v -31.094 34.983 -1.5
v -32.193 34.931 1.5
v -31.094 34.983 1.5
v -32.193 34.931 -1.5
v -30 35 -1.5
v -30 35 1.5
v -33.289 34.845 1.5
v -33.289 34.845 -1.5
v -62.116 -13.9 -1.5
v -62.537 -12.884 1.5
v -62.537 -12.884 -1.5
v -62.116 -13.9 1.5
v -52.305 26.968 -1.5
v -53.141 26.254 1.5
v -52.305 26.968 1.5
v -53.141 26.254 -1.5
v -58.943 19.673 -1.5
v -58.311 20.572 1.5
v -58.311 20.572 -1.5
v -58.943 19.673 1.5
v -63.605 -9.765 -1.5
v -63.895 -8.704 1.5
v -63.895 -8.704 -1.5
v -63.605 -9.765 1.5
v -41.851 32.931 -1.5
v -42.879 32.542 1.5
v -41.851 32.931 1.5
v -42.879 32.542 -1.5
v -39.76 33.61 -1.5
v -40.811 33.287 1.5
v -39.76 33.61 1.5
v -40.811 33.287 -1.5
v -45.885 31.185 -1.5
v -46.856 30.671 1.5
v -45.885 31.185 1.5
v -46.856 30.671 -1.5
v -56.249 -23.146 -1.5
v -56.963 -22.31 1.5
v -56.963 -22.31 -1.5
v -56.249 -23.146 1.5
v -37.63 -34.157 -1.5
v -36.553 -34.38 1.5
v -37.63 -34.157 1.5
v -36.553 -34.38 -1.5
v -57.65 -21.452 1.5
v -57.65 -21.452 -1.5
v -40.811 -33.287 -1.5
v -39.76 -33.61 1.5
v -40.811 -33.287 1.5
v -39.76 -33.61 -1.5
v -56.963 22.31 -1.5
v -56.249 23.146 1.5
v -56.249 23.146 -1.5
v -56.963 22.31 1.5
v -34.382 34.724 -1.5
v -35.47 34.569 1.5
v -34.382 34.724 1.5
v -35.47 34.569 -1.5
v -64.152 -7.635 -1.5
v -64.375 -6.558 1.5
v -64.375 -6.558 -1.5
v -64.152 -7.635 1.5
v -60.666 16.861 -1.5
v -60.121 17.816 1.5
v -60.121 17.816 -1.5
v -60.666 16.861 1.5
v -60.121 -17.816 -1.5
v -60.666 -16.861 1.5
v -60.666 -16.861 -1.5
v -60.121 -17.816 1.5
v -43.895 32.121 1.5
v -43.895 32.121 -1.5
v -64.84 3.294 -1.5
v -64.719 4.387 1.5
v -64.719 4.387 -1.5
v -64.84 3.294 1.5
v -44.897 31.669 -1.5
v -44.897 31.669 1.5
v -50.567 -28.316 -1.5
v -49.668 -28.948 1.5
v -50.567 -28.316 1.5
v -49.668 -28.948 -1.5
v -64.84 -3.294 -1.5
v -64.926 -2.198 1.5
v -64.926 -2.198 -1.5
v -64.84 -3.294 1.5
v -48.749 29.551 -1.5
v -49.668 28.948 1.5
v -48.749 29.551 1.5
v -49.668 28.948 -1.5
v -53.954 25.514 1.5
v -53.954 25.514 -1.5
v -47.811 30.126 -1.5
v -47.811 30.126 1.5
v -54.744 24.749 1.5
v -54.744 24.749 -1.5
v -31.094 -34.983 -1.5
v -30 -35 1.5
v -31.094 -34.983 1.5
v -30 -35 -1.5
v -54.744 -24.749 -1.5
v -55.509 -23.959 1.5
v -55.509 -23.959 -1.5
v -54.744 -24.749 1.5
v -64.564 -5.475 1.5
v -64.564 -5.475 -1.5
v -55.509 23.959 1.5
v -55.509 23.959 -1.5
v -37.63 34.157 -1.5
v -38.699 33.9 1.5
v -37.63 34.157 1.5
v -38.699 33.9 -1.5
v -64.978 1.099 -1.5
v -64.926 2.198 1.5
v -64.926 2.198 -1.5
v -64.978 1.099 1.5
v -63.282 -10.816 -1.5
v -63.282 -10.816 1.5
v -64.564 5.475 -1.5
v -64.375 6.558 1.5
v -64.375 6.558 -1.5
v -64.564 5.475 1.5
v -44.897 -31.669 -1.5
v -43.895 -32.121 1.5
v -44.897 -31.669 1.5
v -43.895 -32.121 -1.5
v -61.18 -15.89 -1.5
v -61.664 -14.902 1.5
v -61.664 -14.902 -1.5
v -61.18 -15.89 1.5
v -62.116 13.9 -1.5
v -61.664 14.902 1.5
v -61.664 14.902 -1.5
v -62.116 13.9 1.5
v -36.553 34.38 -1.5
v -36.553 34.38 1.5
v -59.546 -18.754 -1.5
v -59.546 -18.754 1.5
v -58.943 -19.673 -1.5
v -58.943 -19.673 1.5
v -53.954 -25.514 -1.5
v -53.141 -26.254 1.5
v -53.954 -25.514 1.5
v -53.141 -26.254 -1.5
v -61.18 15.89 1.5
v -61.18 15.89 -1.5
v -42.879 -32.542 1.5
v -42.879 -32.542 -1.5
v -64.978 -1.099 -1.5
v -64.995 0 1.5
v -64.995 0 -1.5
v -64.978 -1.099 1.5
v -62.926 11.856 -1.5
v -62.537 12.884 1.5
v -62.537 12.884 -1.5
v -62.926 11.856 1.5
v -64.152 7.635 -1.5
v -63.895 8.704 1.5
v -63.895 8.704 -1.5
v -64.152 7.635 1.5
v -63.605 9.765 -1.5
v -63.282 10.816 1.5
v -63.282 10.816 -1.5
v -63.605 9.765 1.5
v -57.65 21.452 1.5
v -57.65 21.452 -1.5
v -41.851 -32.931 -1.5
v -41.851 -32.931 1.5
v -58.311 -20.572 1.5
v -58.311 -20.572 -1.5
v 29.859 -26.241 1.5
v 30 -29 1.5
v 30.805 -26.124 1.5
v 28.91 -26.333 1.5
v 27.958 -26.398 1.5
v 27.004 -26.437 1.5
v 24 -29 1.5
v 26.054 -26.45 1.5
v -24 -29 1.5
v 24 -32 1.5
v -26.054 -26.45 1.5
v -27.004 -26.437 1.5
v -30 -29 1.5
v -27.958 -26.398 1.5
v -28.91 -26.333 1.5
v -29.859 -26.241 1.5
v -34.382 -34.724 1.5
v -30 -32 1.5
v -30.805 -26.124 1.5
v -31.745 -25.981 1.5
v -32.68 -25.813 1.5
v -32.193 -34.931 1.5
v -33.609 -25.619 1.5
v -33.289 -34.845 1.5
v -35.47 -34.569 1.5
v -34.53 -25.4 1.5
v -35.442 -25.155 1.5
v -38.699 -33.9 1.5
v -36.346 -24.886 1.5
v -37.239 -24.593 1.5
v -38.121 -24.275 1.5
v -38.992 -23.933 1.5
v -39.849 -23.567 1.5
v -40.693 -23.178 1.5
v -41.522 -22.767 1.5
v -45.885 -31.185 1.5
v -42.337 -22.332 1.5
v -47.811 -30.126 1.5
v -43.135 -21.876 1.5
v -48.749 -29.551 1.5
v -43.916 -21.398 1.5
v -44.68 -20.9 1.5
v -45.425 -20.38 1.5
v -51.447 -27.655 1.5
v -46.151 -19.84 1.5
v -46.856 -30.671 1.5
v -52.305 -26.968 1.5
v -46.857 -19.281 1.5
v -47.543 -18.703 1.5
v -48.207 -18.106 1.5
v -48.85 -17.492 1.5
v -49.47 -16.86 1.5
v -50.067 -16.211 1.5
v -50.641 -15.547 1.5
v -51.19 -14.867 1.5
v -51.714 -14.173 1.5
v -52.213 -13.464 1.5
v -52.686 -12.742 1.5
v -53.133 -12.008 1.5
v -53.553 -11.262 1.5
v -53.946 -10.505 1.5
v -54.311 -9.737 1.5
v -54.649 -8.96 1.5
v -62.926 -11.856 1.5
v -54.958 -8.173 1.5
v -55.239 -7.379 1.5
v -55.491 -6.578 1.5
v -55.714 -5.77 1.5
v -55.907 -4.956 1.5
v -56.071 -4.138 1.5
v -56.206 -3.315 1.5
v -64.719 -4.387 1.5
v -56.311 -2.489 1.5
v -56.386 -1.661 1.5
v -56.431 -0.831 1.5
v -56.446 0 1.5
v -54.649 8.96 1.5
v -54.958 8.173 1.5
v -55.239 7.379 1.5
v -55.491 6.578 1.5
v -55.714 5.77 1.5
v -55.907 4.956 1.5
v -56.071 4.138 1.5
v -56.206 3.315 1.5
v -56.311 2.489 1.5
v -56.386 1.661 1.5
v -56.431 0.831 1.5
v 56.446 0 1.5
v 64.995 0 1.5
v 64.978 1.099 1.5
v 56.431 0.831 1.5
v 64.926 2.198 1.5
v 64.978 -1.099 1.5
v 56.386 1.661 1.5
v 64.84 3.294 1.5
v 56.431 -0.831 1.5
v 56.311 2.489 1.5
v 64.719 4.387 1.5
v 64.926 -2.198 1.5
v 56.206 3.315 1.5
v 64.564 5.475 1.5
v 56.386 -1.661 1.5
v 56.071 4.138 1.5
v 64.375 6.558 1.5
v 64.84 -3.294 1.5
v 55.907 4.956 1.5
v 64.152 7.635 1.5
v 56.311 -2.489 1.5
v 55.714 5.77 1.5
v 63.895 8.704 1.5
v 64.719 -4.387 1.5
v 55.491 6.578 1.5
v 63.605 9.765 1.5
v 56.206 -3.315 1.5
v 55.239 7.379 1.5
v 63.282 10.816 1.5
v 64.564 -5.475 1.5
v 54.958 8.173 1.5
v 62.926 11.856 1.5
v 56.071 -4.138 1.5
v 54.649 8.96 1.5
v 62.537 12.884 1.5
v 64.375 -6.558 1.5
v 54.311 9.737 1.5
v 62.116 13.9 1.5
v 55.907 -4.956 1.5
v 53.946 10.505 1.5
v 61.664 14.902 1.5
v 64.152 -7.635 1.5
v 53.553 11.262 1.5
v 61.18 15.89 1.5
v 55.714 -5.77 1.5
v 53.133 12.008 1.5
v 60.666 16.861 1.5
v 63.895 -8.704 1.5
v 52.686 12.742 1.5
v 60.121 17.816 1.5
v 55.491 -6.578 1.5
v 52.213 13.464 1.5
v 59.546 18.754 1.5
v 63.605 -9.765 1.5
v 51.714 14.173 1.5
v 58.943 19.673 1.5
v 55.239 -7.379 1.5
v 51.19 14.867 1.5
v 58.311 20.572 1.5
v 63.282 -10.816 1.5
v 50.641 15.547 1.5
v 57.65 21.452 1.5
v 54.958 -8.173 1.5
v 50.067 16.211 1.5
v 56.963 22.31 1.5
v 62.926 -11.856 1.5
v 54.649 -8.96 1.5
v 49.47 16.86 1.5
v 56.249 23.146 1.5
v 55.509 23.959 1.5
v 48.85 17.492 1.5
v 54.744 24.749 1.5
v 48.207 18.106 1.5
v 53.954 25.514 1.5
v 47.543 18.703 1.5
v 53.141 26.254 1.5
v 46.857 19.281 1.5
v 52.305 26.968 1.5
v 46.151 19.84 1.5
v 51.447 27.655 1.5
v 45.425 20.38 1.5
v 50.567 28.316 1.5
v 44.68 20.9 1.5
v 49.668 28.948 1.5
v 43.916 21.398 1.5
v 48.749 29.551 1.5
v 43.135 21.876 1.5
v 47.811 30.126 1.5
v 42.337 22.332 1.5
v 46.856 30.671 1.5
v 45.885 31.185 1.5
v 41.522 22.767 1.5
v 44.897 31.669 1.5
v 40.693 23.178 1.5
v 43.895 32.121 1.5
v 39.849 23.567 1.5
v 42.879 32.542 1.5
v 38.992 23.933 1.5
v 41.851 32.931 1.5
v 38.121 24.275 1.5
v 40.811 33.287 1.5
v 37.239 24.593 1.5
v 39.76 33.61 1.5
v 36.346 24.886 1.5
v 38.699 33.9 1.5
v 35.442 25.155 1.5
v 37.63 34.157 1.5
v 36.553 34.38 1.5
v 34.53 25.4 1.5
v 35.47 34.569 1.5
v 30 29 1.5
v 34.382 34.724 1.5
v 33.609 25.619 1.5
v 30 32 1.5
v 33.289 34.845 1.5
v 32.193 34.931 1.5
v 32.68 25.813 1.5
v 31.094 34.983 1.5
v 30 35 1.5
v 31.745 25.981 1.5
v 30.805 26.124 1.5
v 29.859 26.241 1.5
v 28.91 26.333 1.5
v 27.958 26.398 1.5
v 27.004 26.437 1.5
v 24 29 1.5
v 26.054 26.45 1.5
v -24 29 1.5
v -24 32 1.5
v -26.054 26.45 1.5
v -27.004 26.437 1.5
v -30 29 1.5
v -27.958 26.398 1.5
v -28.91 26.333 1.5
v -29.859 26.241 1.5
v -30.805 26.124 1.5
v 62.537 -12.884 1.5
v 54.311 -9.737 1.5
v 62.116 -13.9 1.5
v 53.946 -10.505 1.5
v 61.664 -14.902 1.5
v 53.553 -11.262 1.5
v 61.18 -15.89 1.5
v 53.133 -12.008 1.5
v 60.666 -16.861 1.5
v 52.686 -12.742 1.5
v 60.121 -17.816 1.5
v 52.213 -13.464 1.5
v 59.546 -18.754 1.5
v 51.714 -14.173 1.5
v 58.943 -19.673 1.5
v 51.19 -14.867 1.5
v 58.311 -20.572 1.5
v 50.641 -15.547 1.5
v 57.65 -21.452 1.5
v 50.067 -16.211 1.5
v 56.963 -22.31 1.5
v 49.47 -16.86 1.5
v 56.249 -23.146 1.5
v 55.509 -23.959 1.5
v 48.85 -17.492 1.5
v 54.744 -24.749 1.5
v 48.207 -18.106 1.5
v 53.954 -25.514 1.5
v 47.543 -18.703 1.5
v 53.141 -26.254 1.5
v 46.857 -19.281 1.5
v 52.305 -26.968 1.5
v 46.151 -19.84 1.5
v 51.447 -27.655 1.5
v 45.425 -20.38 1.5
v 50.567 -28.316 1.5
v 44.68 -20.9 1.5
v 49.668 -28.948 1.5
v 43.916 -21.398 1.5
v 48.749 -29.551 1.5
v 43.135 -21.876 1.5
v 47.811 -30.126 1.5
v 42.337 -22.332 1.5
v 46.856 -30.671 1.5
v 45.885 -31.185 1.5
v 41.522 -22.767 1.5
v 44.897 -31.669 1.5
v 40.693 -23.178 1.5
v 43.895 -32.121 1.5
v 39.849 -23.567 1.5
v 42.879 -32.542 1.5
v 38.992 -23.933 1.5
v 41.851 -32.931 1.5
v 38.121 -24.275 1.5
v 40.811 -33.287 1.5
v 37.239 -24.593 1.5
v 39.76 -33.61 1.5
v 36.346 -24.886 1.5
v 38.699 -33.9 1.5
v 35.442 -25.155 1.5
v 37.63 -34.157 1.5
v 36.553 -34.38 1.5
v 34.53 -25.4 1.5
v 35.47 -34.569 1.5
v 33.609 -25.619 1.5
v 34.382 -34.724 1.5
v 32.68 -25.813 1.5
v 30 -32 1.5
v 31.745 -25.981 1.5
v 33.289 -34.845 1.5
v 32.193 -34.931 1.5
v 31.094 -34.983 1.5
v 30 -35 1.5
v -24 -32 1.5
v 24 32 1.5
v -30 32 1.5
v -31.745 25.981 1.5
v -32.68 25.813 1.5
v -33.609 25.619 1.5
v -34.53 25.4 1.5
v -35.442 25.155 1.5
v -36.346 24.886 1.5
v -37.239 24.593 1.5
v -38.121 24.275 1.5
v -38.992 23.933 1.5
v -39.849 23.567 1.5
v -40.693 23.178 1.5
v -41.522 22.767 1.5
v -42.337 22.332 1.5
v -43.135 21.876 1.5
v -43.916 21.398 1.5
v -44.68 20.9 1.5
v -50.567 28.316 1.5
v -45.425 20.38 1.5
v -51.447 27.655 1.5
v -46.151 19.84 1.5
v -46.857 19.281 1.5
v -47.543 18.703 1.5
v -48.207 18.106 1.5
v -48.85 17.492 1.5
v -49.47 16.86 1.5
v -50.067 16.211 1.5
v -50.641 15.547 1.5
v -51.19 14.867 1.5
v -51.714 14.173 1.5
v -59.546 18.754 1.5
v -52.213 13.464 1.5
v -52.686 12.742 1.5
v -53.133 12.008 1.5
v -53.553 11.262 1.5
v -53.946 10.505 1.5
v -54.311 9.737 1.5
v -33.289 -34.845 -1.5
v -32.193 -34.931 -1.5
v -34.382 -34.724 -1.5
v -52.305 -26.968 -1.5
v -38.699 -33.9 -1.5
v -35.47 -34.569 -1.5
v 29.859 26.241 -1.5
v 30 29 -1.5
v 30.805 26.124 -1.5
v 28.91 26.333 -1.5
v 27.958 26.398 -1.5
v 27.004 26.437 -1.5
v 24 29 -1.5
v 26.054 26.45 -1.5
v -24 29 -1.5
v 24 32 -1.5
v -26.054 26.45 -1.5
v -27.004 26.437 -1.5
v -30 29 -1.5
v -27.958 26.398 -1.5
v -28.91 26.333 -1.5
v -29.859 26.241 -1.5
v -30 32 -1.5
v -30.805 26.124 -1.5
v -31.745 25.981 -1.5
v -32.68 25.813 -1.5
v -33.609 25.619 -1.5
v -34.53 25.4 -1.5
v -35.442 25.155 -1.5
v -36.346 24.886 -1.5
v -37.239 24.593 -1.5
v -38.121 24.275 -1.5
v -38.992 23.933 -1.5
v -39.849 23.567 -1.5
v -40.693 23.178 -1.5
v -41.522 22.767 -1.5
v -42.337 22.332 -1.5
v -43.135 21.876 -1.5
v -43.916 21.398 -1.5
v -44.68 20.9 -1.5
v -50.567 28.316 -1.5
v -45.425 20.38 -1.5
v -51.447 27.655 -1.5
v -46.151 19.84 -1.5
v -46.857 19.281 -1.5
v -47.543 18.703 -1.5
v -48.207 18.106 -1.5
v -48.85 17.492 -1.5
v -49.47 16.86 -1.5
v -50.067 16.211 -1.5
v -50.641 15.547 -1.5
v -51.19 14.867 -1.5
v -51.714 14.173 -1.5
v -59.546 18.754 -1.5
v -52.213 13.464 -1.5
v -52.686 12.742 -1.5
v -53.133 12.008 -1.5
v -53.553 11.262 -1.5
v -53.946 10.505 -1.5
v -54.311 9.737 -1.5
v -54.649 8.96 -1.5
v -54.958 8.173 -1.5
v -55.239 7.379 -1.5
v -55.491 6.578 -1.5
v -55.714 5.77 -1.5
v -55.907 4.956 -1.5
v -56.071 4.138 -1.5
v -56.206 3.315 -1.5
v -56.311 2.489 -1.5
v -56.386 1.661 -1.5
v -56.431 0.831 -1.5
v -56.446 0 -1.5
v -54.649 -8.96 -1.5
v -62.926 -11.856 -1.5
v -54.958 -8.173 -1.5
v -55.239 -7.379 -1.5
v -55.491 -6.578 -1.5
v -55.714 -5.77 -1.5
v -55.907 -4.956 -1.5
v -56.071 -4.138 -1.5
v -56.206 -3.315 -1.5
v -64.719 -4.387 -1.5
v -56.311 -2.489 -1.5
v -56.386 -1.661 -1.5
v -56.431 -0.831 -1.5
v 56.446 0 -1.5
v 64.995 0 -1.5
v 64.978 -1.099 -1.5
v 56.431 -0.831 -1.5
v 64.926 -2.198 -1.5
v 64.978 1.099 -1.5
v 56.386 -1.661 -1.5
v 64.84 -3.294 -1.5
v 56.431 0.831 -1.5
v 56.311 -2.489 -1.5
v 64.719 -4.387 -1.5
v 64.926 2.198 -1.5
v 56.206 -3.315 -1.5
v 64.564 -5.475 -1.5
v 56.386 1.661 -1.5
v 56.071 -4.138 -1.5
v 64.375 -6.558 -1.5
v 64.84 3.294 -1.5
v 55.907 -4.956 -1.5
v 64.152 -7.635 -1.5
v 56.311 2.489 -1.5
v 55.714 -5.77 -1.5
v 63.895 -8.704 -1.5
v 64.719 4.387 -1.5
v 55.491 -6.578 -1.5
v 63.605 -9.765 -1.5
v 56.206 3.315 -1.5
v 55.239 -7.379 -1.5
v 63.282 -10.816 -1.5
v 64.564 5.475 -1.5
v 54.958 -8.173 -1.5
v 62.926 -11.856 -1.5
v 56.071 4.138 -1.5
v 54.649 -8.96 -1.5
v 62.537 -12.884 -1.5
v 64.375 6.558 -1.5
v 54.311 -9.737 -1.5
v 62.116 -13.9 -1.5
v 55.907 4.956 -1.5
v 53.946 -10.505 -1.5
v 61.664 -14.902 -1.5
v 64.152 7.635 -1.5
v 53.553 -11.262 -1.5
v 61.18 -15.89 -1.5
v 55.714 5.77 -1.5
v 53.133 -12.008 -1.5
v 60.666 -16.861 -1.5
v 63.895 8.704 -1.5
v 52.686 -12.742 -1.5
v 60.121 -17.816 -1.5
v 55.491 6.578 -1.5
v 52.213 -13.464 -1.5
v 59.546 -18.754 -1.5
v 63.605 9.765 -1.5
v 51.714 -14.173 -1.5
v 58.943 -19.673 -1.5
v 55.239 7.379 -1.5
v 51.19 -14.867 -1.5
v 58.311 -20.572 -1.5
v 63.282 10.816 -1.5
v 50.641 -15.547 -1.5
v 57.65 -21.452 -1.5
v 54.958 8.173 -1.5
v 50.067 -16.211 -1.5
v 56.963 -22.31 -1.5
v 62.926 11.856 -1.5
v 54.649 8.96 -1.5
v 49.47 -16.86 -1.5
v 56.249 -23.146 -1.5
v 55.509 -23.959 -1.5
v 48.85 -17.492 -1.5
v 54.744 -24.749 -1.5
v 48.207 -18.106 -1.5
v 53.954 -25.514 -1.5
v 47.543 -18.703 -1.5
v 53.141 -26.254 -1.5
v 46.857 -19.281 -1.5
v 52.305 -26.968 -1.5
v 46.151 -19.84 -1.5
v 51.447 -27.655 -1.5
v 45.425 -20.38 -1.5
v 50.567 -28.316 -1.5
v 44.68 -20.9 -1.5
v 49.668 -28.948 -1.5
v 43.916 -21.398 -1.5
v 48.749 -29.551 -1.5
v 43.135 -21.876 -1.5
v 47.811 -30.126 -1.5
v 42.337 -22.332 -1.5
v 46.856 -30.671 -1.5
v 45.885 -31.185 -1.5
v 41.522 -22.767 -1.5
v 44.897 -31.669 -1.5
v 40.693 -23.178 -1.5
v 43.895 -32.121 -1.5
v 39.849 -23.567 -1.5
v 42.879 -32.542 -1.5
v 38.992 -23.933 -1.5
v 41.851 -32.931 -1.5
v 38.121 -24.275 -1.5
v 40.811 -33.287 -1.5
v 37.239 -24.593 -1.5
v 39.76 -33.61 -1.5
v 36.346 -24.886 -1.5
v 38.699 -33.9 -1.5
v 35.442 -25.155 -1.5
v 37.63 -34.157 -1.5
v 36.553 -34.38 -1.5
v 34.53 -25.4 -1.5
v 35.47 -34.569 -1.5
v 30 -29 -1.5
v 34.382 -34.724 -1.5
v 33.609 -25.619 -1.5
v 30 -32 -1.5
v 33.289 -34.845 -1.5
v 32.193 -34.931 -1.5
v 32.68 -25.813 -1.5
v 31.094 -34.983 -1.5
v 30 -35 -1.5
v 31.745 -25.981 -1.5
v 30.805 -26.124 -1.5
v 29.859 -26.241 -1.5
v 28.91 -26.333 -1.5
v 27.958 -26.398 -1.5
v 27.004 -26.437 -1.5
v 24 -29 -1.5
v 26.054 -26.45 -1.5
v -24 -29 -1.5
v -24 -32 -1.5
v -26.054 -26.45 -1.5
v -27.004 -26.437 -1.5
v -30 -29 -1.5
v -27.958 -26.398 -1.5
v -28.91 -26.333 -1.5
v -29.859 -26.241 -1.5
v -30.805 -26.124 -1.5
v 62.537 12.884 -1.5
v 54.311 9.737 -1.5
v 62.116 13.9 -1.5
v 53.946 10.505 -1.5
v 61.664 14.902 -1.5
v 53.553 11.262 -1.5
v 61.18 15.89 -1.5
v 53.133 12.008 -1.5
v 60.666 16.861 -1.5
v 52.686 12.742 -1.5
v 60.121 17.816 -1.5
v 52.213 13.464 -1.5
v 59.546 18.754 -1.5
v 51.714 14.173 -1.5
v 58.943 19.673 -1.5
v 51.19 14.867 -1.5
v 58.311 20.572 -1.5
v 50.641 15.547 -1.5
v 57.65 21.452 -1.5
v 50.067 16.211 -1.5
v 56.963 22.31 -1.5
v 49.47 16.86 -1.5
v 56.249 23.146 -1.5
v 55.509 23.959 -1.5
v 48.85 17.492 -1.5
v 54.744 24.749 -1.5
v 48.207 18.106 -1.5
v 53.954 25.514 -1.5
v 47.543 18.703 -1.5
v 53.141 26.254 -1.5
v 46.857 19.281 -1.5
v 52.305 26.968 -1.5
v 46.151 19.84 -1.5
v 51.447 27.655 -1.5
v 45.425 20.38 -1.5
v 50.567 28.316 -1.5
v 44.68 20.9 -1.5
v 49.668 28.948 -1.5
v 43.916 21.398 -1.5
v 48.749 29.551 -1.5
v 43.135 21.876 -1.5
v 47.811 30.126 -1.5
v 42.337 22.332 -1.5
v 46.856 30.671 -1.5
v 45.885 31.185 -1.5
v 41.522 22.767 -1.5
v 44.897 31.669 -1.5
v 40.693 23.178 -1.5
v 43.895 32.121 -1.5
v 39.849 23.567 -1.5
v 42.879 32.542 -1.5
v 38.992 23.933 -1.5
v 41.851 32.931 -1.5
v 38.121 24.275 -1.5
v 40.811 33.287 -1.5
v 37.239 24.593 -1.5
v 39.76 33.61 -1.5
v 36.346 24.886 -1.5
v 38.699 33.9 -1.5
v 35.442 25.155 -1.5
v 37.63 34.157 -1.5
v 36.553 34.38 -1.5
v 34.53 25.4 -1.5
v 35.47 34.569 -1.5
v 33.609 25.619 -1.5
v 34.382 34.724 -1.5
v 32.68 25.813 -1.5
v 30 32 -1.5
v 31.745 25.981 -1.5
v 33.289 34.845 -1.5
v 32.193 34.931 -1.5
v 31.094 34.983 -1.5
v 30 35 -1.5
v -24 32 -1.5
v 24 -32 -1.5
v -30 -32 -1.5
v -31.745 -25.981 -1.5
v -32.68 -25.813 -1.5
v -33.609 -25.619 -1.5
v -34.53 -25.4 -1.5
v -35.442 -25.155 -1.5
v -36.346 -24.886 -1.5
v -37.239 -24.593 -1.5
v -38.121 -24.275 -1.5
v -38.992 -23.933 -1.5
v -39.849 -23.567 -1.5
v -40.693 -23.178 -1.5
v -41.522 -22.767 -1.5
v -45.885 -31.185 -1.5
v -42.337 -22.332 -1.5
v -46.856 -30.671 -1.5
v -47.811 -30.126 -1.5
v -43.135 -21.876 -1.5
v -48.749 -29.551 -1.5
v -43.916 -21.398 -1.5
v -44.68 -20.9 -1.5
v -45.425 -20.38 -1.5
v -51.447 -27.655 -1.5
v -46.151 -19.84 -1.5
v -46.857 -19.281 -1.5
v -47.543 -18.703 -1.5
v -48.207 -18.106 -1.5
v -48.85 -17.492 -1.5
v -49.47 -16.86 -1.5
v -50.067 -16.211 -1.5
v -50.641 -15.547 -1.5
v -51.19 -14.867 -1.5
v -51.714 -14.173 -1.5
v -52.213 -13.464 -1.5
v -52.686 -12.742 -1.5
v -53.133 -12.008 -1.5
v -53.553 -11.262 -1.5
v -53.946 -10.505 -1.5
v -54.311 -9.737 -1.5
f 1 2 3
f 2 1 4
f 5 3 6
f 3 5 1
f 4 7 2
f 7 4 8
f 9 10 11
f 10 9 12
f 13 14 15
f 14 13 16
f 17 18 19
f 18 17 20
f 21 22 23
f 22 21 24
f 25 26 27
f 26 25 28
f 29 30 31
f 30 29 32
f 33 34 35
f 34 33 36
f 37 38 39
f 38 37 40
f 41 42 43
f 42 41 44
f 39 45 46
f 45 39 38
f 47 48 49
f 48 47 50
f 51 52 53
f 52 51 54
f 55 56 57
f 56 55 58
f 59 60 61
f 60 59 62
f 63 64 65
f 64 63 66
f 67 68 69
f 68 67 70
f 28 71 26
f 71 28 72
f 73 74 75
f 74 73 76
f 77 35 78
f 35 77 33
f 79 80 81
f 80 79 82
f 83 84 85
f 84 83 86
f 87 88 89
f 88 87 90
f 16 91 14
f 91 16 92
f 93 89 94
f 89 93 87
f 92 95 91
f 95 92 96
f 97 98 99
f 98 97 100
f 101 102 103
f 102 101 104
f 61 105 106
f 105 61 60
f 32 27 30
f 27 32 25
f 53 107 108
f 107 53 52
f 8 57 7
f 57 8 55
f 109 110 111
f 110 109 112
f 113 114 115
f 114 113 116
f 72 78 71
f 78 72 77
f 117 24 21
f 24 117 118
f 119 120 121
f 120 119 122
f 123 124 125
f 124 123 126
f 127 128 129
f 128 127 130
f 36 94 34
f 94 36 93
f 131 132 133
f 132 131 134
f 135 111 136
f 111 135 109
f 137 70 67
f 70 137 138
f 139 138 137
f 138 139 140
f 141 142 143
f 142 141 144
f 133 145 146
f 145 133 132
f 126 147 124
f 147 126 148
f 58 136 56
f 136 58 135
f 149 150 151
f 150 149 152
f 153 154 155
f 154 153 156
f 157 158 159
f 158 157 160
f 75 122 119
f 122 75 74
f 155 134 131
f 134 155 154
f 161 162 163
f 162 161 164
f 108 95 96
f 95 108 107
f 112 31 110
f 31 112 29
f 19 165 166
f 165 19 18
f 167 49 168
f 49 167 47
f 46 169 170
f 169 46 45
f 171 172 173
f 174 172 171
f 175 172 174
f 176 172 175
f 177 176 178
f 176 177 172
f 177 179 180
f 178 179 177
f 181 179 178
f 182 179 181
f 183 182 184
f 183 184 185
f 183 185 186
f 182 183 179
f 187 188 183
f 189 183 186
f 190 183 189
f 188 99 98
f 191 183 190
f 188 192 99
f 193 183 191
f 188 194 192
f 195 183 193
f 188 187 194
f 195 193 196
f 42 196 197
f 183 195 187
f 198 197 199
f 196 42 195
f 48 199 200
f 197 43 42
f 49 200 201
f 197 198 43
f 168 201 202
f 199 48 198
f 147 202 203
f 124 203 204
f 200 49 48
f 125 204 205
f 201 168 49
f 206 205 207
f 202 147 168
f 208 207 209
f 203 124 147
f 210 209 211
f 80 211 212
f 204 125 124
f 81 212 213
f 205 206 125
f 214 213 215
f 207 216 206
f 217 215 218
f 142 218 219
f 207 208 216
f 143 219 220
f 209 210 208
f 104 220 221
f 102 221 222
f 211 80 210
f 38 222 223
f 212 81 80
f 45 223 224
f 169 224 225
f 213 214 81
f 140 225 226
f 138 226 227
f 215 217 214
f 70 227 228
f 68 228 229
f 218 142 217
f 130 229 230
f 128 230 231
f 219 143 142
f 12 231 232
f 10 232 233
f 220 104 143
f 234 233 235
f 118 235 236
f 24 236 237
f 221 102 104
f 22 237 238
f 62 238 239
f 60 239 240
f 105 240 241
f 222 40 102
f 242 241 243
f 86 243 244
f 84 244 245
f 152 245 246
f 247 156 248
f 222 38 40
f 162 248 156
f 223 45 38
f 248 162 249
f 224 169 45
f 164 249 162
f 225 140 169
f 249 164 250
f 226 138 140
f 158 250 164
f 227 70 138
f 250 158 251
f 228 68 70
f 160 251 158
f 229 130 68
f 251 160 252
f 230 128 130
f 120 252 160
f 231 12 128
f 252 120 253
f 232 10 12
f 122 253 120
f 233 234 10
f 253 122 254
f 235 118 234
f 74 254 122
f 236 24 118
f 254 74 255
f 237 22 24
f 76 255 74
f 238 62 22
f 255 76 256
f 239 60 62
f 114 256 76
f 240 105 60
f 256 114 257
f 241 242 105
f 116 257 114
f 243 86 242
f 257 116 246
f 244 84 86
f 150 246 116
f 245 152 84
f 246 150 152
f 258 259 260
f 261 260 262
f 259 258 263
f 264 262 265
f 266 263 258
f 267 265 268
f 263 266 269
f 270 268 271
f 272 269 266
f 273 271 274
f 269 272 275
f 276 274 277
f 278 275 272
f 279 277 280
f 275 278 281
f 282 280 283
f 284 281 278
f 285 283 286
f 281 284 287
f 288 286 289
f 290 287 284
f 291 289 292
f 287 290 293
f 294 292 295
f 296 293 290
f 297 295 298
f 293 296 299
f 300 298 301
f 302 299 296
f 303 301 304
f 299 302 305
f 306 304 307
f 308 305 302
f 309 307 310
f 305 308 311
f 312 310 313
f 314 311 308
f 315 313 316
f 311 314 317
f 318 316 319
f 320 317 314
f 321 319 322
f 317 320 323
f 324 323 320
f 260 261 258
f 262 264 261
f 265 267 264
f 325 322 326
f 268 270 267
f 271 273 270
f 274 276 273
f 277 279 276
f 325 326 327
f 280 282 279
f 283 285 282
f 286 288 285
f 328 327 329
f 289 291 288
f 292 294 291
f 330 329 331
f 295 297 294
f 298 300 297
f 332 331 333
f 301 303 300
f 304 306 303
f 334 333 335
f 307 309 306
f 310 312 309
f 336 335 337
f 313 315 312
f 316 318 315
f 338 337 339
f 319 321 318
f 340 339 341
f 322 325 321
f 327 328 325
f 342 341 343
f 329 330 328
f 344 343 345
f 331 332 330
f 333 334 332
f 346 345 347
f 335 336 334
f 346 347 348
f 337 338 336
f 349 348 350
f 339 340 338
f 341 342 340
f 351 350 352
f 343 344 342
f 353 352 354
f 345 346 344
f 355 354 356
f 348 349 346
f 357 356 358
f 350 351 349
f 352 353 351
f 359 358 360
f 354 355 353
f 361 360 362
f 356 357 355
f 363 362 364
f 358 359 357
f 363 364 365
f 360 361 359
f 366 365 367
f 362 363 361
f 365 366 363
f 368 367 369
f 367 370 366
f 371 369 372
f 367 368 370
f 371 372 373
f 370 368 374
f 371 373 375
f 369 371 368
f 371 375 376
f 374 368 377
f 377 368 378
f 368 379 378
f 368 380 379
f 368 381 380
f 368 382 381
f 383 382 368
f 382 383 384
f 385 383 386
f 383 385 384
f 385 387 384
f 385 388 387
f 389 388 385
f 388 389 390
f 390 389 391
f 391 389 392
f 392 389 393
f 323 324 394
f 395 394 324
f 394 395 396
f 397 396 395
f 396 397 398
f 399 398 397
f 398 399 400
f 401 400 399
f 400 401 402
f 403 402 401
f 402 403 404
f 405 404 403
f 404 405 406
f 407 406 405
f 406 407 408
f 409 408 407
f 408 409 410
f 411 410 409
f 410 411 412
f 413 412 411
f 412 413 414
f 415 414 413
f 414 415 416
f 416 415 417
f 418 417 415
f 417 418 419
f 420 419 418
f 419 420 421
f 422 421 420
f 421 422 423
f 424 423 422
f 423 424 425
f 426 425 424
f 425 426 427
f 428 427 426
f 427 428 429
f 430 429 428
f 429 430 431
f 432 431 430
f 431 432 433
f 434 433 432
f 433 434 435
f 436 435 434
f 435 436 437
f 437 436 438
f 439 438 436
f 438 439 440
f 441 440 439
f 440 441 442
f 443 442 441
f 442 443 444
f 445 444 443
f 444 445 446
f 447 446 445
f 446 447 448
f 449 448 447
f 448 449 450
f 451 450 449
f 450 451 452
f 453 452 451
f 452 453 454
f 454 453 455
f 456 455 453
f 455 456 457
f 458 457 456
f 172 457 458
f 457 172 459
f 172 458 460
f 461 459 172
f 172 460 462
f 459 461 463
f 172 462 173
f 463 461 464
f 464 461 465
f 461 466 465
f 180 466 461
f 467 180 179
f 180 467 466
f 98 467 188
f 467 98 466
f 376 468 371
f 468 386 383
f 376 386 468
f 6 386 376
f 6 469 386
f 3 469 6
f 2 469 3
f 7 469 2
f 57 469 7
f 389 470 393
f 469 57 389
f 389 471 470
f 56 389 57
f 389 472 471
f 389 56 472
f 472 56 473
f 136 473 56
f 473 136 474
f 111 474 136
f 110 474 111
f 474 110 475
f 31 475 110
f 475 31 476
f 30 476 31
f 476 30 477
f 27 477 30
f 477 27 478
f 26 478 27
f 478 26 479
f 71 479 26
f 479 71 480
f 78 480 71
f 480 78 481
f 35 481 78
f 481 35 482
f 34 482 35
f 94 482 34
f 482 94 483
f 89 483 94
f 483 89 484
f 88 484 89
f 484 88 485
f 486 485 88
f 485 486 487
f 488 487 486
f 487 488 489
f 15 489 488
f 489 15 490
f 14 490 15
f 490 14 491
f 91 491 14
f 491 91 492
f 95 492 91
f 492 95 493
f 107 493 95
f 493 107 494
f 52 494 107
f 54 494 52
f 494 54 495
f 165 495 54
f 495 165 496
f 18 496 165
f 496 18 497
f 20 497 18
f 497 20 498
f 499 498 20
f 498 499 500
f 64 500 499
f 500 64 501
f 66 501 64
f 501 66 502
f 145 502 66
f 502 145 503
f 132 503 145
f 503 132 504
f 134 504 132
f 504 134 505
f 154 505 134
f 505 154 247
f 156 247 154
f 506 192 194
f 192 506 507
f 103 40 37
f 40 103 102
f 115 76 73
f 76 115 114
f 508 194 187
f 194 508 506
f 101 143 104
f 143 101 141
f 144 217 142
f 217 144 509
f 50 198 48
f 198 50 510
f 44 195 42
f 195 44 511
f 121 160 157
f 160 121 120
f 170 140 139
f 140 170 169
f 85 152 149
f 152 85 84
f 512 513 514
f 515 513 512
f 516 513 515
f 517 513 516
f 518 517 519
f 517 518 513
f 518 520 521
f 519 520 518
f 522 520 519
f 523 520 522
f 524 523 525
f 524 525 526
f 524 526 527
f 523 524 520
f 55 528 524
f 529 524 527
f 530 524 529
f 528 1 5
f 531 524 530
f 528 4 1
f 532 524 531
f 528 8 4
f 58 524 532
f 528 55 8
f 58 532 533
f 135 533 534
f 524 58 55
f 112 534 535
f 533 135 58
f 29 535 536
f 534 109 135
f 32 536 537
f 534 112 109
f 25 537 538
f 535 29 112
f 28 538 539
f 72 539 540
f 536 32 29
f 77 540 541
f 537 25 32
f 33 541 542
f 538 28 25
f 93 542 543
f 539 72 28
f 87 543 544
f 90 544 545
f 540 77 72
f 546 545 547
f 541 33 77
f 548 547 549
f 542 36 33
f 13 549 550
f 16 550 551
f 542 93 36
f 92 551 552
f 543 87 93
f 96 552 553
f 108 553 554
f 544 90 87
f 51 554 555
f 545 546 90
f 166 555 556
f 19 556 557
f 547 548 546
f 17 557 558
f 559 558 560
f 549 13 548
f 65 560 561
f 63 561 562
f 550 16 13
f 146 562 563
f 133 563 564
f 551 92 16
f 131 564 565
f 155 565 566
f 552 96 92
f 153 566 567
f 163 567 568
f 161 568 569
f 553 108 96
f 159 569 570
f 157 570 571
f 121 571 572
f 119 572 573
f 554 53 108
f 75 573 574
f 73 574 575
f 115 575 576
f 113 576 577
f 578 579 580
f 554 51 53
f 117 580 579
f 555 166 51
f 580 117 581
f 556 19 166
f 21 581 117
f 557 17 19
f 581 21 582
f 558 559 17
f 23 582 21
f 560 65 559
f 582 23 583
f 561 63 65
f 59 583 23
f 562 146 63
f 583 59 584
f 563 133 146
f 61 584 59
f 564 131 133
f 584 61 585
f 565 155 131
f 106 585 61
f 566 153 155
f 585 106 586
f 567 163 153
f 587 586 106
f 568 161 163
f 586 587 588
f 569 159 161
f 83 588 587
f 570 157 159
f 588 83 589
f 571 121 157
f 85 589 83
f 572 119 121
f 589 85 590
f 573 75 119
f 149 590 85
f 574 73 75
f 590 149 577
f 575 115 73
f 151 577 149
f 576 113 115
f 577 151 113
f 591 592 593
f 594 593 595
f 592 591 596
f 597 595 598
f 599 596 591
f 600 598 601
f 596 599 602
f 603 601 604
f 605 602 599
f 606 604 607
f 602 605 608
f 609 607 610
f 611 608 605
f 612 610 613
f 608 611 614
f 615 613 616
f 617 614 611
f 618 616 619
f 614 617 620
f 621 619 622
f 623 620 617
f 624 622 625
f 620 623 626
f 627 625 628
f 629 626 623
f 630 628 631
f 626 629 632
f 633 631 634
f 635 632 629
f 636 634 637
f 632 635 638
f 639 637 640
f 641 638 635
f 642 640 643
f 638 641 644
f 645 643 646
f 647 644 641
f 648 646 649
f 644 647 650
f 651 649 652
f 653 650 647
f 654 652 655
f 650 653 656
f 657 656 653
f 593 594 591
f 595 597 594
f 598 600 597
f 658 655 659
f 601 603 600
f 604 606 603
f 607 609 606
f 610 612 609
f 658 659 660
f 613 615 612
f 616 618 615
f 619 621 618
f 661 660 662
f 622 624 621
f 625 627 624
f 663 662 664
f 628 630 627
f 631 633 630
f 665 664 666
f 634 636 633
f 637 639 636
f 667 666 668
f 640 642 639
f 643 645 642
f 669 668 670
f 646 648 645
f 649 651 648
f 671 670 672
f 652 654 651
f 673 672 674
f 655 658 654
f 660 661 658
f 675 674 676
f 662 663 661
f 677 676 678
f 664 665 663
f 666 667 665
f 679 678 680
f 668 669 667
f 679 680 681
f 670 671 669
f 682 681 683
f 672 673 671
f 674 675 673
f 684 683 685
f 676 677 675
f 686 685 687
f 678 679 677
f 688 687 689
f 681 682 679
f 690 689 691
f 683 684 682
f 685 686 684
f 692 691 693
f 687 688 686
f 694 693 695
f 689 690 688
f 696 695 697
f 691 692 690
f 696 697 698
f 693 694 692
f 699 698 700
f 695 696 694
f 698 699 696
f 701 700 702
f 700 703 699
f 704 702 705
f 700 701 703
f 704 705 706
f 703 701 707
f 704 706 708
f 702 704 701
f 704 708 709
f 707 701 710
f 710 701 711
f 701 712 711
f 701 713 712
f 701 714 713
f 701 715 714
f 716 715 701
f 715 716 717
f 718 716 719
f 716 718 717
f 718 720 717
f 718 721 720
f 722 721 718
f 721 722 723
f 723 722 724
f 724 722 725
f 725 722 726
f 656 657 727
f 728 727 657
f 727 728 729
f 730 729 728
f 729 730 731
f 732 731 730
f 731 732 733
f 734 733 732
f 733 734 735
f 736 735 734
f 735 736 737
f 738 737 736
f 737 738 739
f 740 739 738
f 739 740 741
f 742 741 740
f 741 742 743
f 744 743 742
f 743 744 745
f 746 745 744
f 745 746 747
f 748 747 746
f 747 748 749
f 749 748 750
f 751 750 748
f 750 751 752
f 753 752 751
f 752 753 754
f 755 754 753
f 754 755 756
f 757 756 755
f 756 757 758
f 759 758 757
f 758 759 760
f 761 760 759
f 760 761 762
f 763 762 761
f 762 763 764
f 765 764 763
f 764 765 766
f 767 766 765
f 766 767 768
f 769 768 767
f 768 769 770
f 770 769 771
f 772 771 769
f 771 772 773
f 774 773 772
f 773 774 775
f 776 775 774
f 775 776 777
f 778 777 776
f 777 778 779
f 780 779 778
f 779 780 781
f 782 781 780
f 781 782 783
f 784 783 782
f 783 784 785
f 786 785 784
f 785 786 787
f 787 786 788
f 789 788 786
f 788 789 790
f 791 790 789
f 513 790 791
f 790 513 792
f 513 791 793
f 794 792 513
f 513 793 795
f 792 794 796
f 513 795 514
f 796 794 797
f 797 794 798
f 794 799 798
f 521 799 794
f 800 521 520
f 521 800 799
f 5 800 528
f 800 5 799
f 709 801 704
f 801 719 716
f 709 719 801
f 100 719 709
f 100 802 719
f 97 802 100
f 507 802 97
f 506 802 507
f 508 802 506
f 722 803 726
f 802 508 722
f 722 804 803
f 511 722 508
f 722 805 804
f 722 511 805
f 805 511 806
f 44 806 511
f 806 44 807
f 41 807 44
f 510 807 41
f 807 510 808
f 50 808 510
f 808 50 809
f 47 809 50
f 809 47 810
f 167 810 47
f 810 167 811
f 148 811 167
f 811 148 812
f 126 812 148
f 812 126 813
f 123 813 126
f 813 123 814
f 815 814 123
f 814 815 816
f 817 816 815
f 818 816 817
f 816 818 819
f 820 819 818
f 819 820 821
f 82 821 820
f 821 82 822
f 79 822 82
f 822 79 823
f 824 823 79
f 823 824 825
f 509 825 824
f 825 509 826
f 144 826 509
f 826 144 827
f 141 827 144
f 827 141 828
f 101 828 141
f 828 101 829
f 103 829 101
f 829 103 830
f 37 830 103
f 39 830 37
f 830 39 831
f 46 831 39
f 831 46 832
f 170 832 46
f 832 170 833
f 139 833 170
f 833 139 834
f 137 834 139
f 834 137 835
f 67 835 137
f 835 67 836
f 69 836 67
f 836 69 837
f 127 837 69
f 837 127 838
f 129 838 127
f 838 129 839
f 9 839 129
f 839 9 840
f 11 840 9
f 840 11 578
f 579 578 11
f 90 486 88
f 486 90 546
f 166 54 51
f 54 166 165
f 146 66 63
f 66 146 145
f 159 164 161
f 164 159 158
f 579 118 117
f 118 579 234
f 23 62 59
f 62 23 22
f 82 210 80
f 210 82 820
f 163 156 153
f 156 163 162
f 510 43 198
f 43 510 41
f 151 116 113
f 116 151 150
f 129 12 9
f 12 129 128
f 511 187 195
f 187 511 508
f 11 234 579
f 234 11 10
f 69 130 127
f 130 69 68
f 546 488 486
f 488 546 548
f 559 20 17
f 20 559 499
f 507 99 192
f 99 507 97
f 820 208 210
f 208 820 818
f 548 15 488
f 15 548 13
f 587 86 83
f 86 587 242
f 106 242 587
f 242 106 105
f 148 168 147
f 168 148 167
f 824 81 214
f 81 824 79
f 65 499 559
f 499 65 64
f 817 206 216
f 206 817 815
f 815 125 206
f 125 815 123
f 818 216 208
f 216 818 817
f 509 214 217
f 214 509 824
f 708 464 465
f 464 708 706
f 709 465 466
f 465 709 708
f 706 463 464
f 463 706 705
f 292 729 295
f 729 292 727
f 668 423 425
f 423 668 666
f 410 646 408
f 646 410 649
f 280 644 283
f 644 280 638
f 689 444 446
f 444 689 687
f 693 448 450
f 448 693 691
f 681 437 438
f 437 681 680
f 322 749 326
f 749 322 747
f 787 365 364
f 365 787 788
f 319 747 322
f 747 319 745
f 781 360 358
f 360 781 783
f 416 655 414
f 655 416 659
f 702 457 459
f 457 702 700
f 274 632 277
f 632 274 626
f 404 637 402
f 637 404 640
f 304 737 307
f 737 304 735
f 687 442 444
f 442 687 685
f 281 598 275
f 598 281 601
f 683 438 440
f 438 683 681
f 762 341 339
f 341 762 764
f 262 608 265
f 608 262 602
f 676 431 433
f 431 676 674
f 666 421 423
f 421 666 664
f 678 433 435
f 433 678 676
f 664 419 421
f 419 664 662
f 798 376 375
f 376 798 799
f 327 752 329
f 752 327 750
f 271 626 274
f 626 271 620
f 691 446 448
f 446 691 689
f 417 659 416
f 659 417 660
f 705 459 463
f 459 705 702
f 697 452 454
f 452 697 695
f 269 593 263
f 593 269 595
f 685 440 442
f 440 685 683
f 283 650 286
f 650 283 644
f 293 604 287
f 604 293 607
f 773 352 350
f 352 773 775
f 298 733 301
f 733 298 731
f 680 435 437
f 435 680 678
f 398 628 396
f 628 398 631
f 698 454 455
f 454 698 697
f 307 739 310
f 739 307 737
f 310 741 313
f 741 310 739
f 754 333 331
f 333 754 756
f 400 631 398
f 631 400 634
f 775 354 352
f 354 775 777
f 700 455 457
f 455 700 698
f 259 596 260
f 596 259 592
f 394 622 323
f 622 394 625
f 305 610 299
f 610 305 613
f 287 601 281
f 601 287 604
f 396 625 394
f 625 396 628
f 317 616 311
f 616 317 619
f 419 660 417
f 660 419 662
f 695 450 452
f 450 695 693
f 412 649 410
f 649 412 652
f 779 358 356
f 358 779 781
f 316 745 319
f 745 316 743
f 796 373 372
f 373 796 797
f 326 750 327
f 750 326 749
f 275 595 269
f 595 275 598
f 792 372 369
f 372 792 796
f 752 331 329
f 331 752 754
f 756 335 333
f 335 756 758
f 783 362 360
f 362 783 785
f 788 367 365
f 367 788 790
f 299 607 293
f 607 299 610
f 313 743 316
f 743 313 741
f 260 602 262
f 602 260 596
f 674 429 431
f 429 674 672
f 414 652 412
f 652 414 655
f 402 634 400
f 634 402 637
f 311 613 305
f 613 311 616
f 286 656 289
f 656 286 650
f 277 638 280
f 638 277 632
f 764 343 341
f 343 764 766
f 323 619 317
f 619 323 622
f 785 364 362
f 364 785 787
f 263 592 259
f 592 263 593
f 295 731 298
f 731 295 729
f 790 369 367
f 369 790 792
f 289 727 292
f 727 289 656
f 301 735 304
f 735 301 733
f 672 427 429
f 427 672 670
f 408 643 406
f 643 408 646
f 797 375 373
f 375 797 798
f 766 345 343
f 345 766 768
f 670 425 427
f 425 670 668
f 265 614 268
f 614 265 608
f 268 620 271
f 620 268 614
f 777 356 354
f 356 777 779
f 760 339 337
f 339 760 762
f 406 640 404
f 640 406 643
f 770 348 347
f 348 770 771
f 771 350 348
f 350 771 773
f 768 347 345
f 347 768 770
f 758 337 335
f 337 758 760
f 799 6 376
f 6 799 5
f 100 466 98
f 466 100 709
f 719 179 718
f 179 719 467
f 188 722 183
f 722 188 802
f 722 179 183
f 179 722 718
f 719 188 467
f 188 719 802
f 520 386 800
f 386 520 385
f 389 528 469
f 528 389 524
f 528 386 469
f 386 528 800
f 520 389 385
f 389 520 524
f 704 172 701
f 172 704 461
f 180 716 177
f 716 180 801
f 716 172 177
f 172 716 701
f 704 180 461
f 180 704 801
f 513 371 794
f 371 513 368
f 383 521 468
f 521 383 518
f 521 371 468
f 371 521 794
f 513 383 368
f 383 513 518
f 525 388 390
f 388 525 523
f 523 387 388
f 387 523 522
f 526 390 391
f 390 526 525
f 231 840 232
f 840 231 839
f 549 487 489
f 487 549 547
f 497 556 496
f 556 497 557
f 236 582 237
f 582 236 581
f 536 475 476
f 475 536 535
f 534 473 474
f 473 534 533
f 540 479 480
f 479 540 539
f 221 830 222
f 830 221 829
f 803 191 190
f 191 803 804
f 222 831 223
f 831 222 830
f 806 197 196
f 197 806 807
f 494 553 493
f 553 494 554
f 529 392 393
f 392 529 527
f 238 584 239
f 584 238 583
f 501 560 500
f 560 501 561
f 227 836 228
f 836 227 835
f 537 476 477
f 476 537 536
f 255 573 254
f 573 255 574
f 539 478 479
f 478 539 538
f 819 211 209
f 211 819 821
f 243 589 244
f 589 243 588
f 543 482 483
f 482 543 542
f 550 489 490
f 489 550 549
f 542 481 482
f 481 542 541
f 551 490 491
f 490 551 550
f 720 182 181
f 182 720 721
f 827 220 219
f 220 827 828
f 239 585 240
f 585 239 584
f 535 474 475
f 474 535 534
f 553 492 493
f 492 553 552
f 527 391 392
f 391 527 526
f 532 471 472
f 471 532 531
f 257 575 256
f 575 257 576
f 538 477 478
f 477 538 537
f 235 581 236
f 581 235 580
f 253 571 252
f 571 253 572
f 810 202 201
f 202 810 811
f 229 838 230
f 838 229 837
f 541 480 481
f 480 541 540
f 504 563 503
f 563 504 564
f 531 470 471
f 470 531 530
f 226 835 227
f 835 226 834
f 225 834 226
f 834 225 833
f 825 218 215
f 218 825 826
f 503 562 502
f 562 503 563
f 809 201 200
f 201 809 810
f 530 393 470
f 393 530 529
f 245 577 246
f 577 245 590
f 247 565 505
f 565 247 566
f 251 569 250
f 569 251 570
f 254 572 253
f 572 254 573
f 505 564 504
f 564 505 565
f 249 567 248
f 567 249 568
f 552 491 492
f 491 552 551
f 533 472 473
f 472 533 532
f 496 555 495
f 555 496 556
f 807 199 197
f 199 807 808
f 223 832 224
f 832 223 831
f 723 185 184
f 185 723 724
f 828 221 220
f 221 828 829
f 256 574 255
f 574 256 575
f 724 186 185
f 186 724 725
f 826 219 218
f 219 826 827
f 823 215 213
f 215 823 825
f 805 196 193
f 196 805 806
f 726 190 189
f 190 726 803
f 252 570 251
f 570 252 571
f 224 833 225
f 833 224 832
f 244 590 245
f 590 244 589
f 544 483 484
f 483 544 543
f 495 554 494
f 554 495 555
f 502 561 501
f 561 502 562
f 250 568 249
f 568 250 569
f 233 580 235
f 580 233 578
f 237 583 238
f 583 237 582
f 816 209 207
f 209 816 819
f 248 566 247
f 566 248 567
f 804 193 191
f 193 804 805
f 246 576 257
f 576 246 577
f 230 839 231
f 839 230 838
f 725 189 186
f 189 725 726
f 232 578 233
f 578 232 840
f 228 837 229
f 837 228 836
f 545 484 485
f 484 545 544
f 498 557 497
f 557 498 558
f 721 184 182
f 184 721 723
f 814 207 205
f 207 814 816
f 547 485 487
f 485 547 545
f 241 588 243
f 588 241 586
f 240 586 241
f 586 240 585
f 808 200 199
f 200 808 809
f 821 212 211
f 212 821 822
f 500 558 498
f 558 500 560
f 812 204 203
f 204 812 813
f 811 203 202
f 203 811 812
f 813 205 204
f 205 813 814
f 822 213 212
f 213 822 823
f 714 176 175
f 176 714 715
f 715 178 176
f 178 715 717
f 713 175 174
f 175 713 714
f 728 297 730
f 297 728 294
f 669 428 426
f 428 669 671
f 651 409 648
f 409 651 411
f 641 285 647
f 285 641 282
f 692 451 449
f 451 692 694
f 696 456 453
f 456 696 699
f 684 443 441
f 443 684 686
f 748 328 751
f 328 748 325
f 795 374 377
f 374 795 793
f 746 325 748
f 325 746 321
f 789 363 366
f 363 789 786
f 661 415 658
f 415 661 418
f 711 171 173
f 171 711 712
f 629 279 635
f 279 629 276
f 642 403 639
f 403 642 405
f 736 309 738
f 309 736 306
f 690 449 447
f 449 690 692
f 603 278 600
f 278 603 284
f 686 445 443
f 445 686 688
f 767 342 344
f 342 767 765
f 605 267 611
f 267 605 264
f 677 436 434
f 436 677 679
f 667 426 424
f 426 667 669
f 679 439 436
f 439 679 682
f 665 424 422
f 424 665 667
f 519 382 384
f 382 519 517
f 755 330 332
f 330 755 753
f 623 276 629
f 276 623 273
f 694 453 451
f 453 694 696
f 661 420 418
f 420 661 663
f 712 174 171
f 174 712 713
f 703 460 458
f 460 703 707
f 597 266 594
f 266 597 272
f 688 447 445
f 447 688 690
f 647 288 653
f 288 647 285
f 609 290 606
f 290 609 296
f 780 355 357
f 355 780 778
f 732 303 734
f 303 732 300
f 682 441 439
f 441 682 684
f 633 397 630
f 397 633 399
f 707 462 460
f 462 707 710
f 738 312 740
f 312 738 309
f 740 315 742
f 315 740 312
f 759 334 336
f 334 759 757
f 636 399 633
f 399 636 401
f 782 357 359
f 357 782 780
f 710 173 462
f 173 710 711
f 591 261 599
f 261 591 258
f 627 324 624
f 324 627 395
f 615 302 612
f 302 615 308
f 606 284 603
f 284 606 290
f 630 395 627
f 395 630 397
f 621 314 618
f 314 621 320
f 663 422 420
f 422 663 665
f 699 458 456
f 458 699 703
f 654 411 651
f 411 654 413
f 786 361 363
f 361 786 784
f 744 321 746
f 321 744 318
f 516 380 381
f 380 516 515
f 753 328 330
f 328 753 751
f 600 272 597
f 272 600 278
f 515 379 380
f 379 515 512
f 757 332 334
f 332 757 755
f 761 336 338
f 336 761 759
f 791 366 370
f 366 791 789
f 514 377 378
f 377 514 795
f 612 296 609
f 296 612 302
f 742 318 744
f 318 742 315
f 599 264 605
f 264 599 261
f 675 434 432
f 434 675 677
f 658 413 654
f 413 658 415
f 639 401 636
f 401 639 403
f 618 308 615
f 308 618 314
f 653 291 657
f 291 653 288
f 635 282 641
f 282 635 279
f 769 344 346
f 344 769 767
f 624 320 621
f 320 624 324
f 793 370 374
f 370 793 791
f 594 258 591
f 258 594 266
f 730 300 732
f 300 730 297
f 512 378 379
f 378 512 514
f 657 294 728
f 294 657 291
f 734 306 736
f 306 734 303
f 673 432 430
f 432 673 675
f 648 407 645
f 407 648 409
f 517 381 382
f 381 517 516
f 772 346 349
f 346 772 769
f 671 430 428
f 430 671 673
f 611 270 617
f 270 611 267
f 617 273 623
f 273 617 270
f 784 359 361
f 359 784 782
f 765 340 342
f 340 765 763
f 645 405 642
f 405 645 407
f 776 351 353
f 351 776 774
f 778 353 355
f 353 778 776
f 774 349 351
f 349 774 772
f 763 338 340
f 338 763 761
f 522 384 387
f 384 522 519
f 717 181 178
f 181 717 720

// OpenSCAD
// file: face-bottom.scad
include <measures.scad>;

module round_corner()
{
    difference()
    {
        // full cylinder
        cylinder(
            r = curvature_y/2,
            h = material_z,
            center = true
            );

        // subtract nearer half
        translate([
            0,
            -curvature_y/2,
            0
            ])
        cube([
            curvature_x*1.2,
            curvature_x,
            material_z*1.2
            ], center=true);
    }
}

module face_bottom_without_holes()
{
    // rectangle in the middle
    cube([
        rect_x,
        rect_y,
        material_z
        ], center=true);

    // left round corner
    translate([
        -rect_x/2 +nothing,
        0,
        0
        ])
    rotate([
        0,
        0,
        90
        ])
    round_corner();

    // right round corner
    translate([
        +rect_x/2 -nothing,
        0,
        0
        ])
    rotate([
        0,
        0,
        -90
        ])
    round_corner();
}

module face_bottom()
{
    difference()
    {
        face_bottom_without_holes();

        // noses
        for (x=[
            -rect_x/2+nose_x/2,
            +rect_x/2-nose_x/2
            ])
        {
            for (y=[
                -rect_y/2+wall_inset+material_z/2,
                +rect_y/2-wall_inset-material_z/2
                ])
            {
                translate([
                    x,
                    y,
                    0
                    ])
                cube([
                    nose_x,
                    material_z,
                    material_z*1.2
                    ], center=true);
            }
        }
    }
}

face_bottom();
// file: measures.scad
/**
 * Pencil box configuration
 * All measures in millimeters
 */

// rendering parameters
$fn = 200;
nothing = 0.005;

// material to cut from
material_x = 350;
material_y = 180;
material_z = 3;

// total size of the box
box_x = 130;
box_y = 70;
box_z = 100;

// measures of the two half circles left and right
curvature_y = box_y;
curvature_x = curvature_y/2;

// measure of rectangle between half circles
rect_x = box_x - 2*curvature_x;
rect_y = box_y;

top_opening_inset = 5.7*material_z;

wall_z = box_z - 2*material_z;

// distance between wall and outer edge
wall_inset = material_z;

curve_radius = box_y/2 - wall_inset - material_z;
curve_length = curve_radius*PI;

// total wall length without anchor
wall_length = 2*rect_x + 2*curve_length;

// nose properties
nose_x = 2*material_z;
nose_z = material_z;

// anchor
anchor_width = 10;
anchor_height = 30;
anchor_length = 20;

// for preview
pillar_count = 20;
pillar_angle = 180 / (pillar_count-1);
pillar_width = 4;

part_spacing = 1;
// main file
include <measures.scad>;
use <face-bottom.scad>;

module face_top()
{
    difference()
    {
        face_bottom();

        // opening hole
        scale([
            1 - top_opening_inset/box_x,
            1 - top_opening_inset/box_y,
            1.2
            ])
        face_bottom_without_holes();
    }
}

face_top();
